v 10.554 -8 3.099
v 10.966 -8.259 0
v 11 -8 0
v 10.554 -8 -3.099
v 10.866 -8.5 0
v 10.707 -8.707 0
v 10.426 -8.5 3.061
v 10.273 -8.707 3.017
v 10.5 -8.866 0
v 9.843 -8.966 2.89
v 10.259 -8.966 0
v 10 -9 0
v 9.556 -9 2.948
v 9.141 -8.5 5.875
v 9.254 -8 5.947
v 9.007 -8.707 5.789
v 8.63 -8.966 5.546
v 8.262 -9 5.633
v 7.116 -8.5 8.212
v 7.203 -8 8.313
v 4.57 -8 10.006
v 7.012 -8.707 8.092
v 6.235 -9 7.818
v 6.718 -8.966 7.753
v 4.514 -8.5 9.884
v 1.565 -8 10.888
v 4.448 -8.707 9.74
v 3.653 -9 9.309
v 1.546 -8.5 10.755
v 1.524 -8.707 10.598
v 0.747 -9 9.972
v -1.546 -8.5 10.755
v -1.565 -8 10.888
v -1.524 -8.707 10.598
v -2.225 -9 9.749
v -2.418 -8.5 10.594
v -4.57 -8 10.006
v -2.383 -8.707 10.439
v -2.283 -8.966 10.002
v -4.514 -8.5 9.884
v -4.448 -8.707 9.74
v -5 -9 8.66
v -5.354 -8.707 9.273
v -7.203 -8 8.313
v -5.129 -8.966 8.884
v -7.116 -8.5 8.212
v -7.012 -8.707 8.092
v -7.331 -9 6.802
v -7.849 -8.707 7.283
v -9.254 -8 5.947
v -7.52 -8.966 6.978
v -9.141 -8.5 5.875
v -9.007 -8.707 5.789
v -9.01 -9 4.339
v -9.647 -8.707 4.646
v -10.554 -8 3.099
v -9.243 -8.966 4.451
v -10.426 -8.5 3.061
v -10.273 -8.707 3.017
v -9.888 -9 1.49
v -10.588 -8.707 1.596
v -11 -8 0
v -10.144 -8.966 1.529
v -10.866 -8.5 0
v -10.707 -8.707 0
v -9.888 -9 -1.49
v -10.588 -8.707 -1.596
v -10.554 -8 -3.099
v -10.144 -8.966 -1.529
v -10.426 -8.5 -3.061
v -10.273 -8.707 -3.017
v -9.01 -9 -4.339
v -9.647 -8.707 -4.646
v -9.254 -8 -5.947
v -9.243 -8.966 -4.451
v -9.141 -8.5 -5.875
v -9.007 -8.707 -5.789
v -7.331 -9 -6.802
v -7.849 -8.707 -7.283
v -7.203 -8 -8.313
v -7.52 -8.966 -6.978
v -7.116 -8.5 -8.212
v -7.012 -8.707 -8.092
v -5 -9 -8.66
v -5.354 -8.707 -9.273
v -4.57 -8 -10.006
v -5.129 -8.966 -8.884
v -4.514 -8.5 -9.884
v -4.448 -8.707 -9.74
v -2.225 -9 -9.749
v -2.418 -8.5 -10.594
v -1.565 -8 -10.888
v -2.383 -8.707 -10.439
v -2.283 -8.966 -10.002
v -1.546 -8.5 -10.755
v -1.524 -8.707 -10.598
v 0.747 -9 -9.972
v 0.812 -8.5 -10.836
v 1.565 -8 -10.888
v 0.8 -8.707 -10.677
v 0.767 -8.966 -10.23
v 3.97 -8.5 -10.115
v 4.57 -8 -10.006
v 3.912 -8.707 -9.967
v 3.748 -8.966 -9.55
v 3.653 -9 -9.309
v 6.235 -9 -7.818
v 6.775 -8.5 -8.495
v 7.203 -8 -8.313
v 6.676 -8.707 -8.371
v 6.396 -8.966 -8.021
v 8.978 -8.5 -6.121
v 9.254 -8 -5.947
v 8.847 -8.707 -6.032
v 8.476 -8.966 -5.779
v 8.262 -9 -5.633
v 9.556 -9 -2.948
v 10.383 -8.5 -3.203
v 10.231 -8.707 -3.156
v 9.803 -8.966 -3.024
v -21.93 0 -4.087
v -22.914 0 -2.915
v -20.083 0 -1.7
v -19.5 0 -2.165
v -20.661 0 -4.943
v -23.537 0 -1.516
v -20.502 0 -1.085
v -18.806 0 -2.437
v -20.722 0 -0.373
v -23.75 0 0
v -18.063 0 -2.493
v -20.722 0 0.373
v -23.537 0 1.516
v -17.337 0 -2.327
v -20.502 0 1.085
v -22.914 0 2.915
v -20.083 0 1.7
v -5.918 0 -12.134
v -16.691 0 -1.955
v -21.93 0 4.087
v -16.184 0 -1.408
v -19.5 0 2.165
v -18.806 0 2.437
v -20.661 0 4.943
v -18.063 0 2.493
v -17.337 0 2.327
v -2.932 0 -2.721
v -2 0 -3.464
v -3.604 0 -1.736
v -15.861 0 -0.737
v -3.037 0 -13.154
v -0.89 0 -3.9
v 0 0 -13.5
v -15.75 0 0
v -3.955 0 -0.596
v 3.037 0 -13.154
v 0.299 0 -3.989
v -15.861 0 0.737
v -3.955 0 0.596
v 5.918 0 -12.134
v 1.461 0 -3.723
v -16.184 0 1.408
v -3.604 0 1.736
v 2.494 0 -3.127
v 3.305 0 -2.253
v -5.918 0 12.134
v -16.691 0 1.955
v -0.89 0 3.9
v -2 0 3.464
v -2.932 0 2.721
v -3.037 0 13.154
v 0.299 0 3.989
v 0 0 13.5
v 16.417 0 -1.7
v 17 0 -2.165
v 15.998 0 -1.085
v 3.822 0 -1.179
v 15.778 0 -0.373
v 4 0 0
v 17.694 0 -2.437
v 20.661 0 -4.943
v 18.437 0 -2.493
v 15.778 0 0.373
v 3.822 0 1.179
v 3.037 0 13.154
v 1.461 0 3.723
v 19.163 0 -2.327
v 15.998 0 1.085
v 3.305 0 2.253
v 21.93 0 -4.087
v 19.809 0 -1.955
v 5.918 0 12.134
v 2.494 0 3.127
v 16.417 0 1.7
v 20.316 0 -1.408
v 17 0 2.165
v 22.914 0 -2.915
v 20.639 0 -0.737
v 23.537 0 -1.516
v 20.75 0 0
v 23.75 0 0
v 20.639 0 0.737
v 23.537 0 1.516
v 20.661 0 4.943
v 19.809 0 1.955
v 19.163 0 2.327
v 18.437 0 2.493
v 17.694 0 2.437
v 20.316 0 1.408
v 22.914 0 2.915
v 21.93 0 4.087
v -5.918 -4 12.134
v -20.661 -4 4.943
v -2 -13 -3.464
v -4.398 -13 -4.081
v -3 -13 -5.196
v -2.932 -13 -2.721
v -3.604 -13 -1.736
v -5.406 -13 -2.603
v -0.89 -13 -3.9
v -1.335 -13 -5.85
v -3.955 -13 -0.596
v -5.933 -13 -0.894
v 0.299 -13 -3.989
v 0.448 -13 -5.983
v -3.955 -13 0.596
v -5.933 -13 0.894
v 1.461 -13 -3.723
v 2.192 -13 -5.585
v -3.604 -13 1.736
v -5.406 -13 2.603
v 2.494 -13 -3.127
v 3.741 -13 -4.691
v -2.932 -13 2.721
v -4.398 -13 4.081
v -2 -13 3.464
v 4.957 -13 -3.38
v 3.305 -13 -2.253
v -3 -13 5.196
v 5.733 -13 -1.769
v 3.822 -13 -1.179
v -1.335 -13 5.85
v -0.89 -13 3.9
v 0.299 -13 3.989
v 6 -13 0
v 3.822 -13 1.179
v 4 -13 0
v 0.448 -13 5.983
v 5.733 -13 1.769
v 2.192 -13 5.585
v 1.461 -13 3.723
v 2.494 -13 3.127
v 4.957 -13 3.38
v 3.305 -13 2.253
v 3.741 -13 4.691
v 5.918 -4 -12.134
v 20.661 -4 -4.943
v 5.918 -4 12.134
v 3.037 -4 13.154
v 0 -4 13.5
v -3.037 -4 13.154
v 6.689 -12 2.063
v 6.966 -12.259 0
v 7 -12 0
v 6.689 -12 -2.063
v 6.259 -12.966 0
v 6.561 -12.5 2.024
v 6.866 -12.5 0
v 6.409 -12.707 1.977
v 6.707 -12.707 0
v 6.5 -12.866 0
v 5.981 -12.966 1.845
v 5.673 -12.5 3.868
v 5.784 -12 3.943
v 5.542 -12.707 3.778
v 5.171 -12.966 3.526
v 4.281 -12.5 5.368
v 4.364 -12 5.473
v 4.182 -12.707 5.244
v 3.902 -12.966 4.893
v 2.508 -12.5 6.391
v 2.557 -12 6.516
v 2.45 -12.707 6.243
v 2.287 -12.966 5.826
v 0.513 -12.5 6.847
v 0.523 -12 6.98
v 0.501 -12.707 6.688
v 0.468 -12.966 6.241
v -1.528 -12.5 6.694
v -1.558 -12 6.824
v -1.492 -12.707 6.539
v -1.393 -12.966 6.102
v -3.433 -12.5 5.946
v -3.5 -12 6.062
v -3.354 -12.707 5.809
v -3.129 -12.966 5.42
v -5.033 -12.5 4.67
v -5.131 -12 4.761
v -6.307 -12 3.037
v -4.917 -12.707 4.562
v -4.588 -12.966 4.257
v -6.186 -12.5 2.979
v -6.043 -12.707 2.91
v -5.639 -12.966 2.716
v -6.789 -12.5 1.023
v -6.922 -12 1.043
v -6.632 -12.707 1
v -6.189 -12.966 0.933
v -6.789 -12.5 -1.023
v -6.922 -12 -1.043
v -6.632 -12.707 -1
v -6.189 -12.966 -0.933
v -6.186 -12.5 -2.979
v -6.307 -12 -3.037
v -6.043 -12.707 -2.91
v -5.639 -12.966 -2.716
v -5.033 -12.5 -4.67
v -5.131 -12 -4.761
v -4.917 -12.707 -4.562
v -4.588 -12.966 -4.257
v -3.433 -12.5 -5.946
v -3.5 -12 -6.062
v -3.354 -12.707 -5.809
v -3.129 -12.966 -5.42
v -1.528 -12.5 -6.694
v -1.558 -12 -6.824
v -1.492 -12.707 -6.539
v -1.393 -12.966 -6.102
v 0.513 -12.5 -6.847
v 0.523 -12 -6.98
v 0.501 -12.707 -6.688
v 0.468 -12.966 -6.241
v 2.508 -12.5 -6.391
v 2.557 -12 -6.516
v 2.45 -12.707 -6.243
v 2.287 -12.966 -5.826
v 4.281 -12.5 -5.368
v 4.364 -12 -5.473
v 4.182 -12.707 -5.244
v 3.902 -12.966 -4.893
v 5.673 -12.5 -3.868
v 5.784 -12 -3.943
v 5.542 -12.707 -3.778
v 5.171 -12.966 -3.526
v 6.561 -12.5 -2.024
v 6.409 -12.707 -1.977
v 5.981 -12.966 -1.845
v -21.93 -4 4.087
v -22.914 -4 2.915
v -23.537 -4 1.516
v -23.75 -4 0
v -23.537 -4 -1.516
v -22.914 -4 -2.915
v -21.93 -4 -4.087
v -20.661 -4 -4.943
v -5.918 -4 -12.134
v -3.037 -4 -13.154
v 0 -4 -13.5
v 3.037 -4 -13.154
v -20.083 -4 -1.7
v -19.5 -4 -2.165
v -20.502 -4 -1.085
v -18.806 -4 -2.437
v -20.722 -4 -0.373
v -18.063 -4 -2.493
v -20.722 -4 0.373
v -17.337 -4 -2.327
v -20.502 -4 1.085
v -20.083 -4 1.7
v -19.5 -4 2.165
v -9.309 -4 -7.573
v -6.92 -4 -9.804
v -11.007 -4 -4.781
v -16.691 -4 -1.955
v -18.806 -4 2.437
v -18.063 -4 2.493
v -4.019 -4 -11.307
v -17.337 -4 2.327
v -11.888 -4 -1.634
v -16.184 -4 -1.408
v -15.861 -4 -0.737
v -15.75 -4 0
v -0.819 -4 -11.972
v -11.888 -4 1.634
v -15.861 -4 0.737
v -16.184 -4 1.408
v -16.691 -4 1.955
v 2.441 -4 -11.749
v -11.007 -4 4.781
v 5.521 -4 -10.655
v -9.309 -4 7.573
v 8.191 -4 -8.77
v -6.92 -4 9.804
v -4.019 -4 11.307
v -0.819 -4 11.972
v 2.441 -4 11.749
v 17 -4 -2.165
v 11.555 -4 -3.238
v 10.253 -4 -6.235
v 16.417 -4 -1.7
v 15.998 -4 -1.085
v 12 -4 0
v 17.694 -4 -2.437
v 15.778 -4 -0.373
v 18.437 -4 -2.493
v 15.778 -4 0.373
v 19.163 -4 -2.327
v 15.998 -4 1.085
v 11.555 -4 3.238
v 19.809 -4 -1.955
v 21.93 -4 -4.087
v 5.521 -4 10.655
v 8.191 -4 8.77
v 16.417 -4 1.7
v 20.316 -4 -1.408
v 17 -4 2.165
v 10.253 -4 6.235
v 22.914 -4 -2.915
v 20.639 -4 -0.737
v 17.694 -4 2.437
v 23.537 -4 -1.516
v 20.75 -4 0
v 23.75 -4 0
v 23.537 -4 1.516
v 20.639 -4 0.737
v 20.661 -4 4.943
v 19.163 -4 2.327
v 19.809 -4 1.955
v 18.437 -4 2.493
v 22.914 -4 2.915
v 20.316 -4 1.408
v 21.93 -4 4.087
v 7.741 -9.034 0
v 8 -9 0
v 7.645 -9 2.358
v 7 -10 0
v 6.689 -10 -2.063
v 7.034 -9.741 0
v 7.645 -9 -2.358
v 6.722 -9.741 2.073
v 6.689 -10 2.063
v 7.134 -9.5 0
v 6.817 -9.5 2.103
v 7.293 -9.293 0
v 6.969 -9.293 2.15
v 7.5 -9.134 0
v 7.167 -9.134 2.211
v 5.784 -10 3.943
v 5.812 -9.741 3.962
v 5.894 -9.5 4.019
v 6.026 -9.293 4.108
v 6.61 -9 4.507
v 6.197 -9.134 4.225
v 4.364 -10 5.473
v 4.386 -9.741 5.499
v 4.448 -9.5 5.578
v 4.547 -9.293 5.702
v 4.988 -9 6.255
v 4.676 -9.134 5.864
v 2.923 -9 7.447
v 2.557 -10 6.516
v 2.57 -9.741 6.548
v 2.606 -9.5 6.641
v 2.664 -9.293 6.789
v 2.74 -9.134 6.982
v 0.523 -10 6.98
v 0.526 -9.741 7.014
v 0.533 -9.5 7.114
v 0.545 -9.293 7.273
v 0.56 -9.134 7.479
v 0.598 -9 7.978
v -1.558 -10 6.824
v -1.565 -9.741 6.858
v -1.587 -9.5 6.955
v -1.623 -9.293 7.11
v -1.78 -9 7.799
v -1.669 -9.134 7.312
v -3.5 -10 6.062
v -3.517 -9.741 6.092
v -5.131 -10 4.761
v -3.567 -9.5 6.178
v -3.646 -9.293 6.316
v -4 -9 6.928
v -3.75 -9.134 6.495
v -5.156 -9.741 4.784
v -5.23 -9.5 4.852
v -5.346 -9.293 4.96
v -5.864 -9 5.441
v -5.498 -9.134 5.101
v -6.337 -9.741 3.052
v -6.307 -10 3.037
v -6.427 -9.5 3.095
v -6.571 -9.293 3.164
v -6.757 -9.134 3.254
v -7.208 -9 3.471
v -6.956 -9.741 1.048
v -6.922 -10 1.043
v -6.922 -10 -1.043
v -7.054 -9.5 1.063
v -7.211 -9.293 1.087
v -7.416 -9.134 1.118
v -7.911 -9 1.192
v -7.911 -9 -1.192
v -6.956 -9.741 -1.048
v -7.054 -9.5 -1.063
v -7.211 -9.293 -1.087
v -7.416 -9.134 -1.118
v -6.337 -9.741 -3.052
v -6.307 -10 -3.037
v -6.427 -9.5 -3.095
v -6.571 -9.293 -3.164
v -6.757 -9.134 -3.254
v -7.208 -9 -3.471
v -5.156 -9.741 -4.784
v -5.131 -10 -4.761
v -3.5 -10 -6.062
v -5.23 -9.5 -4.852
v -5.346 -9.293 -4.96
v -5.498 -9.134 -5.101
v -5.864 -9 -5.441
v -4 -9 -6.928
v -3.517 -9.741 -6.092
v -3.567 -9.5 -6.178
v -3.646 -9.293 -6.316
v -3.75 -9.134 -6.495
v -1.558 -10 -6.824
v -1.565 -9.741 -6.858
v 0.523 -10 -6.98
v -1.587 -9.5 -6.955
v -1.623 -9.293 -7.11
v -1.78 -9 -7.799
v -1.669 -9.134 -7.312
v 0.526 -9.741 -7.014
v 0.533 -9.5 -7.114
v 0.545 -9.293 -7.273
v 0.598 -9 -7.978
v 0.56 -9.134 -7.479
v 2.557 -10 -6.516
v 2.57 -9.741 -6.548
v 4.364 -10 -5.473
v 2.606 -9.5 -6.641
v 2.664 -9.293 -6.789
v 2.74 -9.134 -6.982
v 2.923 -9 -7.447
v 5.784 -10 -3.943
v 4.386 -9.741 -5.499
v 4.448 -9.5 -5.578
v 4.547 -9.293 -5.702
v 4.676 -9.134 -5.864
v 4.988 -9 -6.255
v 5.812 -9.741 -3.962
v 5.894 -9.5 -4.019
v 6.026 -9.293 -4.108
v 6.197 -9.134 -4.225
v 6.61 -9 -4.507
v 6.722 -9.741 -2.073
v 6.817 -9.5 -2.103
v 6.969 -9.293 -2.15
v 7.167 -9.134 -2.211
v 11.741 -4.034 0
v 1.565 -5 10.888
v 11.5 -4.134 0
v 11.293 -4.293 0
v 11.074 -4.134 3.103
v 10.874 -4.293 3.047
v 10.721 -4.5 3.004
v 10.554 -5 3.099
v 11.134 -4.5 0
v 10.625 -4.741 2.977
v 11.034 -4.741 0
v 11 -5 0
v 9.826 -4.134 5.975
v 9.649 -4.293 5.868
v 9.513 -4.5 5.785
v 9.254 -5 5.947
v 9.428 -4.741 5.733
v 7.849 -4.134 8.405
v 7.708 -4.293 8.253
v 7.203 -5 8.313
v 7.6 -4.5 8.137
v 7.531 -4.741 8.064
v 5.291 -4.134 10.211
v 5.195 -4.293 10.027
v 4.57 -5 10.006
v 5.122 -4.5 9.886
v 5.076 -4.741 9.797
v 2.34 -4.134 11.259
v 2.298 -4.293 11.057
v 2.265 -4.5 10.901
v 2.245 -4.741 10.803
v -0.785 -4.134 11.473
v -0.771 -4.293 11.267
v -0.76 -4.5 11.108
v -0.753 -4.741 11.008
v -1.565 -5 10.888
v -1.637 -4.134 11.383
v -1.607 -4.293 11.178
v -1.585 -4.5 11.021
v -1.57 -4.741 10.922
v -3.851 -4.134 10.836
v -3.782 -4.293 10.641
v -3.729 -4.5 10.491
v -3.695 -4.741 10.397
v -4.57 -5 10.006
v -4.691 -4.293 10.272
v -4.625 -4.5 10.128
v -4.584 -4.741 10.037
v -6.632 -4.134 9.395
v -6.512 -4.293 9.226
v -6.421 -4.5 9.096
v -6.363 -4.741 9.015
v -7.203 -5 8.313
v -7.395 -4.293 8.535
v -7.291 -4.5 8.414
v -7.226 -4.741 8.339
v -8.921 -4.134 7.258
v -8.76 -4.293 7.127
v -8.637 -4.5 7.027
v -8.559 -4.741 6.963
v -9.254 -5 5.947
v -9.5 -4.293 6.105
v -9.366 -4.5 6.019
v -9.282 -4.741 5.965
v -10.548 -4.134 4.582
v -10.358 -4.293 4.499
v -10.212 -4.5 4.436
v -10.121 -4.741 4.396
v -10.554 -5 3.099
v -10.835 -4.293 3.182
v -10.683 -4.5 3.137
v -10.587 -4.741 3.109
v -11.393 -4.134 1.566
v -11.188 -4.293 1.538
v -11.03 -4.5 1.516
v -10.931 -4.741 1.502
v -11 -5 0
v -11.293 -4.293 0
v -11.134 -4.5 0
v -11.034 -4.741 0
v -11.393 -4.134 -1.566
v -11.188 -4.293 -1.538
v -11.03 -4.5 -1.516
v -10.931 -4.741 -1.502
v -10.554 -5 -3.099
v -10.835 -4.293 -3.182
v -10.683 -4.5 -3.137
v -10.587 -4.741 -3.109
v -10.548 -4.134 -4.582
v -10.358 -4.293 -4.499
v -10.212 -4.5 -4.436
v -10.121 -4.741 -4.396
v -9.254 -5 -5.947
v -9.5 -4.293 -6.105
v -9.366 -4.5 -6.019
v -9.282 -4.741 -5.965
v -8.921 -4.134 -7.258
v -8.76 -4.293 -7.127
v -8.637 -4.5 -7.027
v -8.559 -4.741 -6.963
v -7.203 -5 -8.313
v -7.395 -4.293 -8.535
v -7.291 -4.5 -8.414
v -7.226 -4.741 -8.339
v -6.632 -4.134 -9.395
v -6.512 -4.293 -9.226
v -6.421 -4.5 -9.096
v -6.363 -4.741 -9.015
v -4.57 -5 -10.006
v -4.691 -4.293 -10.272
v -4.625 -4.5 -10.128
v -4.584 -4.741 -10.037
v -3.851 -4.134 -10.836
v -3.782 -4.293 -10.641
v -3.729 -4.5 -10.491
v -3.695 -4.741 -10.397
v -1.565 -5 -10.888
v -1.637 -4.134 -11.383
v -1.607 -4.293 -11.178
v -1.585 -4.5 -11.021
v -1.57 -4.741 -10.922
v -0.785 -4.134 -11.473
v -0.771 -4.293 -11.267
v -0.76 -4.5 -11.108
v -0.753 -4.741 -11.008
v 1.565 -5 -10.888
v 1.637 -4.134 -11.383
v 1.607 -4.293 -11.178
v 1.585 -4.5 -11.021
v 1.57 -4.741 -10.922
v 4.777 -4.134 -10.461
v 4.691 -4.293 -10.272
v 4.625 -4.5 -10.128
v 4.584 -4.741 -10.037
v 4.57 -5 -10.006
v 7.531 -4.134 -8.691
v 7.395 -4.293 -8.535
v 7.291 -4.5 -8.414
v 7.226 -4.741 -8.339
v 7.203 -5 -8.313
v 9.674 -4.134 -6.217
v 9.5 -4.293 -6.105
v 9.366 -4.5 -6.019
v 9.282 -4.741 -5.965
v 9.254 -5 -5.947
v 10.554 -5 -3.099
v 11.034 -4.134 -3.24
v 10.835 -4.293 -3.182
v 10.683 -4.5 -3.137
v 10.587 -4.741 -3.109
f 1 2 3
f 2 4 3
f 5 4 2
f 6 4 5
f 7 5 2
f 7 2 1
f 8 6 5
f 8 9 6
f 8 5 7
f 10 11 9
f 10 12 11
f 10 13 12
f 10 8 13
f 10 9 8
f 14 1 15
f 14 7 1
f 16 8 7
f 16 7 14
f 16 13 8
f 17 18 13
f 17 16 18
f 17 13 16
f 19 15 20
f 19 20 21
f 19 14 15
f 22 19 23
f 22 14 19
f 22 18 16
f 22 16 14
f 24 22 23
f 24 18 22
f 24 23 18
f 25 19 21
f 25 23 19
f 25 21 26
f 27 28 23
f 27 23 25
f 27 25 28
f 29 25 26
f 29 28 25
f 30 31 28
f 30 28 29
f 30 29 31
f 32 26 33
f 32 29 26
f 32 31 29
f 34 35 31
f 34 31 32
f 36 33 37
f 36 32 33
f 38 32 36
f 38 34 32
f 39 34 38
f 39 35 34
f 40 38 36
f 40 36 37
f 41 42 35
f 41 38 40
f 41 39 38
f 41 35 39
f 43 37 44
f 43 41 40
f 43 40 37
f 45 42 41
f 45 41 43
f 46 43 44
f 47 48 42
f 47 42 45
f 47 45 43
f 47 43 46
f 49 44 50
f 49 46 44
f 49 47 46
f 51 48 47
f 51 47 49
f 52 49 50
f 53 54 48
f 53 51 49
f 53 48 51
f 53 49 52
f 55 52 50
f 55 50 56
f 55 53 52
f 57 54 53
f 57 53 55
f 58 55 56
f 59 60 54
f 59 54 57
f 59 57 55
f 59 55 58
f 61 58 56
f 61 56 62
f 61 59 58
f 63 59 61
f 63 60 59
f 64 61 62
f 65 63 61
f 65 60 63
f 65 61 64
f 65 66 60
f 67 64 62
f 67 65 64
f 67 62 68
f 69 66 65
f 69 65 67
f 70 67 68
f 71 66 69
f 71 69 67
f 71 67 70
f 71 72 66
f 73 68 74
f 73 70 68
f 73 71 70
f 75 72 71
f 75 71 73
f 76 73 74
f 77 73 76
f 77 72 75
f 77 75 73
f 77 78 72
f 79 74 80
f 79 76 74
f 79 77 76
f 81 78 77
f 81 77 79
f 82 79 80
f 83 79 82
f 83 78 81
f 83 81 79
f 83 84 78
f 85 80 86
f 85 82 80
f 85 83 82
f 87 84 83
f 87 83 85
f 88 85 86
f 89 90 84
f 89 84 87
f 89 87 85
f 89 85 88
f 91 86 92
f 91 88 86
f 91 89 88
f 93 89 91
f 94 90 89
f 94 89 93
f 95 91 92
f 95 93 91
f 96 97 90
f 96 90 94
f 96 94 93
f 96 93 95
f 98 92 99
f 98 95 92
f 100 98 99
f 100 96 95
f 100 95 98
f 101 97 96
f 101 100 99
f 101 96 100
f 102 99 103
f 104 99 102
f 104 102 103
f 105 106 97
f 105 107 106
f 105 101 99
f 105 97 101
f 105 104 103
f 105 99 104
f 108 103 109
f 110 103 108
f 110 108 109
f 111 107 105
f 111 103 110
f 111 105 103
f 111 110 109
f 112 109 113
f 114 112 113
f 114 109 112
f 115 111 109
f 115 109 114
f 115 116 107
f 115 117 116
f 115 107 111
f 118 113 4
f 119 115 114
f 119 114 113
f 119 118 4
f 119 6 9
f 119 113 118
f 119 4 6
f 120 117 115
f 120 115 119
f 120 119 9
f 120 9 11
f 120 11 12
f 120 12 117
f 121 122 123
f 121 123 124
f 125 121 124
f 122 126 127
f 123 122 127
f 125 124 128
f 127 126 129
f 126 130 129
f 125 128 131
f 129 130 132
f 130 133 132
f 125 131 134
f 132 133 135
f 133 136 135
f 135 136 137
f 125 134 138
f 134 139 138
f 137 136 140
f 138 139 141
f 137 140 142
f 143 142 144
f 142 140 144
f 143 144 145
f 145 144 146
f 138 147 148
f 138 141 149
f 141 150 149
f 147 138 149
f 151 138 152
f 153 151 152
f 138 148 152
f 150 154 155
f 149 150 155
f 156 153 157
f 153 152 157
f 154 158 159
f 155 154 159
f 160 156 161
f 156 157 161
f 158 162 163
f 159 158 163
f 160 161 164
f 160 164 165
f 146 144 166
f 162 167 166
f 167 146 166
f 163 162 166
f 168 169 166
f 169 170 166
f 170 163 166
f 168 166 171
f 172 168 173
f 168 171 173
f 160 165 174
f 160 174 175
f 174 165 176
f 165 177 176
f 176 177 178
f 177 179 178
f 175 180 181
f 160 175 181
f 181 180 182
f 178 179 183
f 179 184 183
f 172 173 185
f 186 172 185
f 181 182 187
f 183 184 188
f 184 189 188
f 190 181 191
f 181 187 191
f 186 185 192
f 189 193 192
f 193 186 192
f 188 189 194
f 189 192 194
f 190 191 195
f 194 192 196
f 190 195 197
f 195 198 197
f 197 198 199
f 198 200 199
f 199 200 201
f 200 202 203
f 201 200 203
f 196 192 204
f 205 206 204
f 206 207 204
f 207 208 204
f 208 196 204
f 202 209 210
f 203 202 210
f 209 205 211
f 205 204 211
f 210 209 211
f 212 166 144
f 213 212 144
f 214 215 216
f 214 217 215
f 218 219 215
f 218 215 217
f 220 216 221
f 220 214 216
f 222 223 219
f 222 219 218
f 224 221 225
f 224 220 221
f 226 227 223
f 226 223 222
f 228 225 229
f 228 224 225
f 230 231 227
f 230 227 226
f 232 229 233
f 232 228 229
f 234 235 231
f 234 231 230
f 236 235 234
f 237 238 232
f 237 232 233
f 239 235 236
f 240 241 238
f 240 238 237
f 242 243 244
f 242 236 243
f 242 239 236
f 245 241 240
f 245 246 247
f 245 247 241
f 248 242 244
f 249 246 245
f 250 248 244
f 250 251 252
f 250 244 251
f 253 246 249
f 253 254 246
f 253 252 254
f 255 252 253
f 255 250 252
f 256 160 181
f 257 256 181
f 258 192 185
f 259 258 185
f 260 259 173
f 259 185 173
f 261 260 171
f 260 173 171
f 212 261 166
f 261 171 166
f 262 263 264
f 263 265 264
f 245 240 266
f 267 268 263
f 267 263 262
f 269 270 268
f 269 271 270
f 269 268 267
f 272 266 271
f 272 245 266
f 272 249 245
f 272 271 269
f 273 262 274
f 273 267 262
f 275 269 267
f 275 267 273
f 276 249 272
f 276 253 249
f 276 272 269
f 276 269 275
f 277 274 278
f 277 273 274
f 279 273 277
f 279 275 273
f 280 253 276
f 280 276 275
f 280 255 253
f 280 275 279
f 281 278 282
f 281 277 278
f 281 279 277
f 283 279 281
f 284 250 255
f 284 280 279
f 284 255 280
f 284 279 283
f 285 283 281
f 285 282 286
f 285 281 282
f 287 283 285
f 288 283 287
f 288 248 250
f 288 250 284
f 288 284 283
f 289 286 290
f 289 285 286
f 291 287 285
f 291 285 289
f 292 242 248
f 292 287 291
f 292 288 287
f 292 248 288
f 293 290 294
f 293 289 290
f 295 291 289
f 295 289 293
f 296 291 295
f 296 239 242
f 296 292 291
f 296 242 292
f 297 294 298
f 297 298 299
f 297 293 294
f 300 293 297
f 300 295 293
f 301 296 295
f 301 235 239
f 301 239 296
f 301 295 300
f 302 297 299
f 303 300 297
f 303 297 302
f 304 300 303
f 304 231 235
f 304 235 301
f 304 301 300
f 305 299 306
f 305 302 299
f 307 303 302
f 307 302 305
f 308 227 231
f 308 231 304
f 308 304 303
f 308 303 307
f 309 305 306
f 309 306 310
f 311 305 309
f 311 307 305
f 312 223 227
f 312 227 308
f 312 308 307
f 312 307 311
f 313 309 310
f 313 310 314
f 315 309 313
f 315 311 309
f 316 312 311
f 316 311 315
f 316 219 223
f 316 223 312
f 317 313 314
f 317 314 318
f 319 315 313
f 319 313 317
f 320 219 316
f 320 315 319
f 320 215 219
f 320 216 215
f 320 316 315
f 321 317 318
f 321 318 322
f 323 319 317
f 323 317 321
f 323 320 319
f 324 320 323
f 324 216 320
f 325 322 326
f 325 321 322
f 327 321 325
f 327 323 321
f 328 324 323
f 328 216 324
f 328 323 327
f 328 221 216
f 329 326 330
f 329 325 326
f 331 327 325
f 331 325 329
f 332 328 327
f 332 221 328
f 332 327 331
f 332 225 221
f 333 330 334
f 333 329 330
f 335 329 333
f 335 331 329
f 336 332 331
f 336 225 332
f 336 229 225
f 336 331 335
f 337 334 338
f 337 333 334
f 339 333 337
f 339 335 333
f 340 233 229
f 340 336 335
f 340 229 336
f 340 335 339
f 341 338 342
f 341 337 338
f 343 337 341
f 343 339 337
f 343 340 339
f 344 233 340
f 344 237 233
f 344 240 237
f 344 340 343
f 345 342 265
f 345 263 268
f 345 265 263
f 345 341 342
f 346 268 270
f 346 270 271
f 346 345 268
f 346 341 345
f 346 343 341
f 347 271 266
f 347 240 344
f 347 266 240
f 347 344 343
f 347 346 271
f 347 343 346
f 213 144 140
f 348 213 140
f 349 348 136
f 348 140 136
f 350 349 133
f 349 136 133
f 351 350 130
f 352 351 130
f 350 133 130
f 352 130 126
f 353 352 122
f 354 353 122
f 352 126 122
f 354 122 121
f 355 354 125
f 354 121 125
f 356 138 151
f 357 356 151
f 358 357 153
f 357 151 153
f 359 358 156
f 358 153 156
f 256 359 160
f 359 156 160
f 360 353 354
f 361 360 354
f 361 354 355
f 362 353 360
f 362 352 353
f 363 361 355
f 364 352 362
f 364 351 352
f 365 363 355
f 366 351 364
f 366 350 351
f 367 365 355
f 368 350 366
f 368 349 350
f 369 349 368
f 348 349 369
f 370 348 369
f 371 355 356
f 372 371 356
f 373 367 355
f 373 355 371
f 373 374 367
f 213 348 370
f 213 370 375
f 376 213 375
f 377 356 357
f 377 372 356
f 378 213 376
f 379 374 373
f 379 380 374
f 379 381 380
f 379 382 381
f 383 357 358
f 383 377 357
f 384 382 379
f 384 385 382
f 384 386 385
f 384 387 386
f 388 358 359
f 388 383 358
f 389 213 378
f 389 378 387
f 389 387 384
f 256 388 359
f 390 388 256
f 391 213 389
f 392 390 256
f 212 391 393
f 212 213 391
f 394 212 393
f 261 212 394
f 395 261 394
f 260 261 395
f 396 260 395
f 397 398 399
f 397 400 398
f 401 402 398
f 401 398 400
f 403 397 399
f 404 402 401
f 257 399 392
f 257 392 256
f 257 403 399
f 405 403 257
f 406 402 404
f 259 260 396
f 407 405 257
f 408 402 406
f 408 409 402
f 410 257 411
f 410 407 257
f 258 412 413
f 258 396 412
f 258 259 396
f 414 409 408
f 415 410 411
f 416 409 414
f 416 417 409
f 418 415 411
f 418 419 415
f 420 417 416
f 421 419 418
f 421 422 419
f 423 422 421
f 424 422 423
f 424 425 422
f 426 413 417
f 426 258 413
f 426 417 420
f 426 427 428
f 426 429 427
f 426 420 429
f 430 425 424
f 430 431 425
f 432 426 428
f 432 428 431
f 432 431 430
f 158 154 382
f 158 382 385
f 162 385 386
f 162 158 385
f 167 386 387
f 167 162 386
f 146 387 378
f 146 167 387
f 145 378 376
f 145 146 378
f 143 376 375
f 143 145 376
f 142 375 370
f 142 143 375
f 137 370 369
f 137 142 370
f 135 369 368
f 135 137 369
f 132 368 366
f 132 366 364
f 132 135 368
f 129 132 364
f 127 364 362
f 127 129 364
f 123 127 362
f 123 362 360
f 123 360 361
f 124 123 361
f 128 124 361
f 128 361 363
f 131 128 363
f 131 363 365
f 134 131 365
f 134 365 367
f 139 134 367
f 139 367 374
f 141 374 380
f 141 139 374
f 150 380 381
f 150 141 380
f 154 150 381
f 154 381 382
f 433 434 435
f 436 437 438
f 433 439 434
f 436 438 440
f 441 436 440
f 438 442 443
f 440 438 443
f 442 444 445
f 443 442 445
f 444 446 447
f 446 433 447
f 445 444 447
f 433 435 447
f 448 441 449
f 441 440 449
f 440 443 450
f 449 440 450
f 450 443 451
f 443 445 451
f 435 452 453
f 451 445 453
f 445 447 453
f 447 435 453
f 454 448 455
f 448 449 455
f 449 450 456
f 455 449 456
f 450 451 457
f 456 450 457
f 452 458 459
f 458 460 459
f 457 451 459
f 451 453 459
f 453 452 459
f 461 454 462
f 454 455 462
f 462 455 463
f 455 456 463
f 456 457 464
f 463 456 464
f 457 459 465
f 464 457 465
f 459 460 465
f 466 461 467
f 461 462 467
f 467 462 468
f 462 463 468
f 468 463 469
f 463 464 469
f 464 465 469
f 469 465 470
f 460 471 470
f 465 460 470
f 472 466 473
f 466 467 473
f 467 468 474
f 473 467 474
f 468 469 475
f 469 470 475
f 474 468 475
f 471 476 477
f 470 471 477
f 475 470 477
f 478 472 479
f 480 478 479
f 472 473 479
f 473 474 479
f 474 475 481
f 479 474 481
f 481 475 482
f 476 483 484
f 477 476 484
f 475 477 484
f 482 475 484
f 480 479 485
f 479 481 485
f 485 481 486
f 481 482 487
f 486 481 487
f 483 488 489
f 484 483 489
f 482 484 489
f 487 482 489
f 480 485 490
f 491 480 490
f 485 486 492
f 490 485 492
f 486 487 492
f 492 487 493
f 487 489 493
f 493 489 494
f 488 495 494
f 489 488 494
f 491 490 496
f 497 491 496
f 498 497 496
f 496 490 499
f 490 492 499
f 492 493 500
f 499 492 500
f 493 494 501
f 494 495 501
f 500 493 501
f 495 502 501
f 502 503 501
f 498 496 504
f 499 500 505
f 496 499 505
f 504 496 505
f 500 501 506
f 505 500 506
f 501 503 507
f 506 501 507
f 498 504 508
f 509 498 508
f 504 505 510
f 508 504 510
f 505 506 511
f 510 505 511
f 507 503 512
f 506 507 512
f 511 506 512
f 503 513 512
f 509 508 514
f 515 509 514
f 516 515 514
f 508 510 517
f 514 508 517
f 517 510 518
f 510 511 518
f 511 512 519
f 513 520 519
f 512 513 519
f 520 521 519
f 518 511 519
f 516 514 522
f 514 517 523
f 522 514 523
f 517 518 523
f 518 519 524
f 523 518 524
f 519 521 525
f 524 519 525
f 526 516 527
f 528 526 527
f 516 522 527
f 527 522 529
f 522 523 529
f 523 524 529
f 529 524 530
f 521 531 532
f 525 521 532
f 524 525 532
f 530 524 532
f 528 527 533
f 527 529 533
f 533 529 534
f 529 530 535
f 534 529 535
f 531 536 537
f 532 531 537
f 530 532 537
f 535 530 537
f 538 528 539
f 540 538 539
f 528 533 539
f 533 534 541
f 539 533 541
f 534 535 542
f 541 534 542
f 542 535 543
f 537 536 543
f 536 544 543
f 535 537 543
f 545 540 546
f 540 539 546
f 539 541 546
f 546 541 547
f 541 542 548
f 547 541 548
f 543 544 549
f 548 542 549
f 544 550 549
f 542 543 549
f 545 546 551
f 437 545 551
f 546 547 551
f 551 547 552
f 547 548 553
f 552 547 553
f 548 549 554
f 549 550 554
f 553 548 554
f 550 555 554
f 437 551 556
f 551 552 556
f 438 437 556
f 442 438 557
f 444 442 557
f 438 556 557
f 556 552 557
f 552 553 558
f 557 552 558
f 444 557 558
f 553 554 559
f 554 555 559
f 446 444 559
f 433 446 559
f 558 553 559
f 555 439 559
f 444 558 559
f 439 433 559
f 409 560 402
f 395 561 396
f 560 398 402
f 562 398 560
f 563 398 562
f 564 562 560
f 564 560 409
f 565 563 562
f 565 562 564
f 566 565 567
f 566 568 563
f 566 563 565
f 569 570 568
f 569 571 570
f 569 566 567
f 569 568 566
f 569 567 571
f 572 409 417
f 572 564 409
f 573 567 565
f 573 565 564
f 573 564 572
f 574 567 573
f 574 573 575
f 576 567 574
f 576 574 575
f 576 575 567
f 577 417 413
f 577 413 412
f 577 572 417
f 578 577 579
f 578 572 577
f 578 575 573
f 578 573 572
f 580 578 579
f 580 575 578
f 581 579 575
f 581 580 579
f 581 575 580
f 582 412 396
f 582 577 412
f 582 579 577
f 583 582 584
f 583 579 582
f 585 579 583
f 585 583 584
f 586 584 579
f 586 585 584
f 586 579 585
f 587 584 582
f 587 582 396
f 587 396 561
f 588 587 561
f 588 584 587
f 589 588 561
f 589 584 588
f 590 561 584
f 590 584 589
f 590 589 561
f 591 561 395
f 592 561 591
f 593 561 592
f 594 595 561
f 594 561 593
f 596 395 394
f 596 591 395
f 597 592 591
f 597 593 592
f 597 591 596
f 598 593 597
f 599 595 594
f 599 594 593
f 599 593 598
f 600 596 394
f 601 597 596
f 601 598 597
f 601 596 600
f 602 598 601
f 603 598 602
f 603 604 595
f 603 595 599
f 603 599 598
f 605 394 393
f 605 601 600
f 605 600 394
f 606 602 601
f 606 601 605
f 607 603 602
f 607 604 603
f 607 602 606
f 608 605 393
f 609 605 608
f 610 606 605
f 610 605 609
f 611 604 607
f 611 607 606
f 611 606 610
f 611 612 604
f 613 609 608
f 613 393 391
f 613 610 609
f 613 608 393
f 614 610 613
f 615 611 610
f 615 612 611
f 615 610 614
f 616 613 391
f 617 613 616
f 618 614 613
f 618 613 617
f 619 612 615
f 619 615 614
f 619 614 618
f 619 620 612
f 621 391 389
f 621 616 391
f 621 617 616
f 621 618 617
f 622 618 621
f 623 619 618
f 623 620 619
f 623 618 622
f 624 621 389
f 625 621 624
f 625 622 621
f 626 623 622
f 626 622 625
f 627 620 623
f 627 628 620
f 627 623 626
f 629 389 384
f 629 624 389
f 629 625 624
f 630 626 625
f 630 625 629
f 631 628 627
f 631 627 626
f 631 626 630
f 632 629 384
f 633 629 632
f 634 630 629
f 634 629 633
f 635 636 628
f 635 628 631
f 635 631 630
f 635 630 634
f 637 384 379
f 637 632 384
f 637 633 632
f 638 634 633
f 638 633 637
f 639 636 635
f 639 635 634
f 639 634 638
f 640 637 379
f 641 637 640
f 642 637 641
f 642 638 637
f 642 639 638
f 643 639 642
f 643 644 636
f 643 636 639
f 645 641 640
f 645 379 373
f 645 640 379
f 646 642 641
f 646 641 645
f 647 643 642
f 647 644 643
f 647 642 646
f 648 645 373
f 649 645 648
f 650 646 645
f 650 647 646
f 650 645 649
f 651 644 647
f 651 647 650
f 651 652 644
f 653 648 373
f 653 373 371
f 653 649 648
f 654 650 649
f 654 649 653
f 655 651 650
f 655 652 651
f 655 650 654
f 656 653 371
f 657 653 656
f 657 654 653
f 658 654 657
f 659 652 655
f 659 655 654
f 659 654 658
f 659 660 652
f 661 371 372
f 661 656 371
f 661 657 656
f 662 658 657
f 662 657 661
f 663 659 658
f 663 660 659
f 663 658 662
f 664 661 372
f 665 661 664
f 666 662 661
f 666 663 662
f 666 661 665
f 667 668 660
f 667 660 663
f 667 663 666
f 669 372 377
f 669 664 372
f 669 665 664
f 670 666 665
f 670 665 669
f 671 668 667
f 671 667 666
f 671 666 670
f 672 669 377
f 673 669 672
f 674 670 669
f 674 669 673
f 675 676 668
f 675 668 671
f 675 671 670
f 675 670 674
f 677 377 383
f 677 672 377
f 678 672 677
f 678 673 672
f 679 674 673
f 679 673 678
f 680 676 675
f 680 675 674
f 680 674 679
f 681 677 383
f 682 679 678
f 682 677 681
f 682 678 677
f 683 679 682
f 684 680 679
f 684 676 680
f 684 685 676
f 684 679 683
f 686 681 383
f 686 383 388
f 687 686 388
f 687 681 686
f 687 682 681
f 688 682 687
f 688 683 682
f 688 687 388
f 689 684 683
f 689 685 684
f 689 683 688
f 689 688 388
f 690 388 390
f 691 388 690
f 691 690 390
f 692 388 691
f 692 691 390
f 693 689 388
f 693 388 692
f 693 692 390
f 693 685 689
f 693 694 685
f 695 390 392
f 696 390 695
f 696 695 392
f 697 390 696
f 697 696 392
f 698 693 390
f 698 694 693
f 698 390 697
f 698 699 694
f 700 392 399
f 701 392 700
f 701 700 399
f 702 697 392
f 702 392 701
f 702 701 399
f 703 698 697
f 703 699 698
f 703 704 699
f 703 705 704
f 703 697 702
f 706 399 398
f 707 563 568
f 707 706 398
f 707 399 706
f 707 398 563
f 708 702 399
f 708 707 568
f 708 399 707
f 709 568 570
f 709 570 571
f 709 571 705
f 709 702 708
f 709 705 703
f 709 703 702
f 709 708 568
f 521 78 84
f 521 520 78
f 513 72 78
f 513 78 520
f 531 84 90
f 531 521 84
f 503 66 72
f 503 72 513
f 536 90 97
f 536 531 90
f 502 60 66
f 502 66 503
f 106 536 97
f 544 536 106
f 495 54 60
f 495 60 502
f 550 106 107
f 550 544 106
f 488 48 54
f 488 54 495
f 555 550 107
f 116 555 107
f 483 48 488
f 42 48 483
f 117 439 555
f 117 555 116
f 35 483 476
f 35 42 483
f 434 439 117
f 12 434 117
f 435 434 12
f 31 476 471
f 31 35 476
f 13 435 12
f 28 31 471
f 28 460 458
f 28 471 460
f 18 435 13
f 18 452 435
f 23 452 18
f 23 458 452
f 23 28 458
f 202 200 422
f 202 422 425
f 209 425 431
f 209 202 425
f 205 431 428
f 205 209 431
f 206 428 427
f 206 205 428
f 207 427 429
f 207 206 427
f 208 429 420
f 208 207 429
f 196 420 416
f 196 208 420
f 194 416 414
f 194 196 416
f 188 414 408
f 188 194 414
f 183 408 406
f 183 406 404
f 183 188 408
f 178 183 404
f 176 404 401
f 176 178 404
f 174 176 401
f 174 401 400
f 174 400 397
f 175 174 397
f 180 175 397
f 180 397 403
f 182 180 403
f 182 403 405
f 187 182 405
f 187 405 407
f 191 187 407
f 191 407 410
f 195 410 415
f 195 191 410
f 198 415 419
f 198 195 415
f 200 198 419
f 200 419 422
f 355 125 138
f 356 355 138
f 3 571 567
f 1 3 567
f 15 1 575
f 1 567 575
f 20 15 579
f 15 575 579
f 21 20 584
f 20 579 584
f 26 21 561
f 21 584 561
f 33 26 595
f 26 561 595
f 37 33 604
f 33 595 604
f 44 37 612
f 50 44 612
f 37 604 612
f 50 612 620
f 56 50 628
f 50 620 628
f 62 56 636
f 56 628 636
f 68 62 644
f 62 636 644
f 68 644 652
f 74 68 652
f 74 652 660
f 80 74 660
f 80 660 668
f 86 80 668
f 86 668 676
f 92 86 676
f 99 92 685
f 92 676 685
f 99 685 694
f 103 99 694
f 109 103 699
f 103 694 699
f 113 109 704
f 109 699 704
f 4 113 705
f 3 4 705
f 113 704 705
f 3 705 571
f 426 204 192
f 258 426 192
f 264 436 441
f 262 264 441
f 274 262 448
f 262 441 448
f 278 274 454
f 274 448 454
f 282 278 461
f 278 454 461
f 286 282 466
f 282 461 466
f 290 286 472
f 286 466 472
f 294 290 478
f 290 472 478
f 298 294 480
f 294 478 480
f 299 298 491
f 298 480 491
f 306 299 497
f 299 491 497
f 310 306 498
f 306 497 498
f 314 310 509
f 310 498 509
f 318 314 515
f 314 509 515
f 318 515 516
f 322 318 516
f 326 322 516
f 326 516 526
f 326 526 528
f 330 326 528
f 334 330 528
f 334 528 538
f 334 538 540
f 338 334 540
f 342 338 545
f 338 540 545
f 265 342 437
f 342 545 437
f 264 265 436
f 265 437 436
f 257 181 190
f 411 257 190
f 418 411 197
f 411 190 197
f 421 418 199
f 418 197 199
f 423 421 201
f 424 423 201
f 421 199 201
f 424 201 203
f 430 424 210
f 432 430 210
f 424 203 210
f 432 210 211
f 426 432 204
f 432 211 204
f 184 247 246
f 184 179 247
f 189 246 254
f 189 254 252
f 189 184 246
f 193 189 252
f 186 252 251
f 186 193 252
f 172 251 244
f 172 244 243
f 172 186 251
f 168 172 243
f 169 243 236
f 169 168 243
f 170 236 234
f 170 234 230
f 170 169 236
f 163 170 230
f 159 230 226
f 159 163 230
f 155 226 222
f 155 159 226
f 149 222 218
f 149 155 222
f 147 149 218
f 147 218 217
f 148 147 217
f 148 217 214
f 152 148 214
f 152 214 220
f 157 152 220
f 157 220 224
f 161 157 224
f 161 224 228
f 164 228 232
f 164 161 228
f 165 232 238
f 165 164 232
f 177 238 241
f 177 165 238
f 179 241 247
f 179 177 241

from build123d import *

# Parameters (mm, degrees)
F0_R     = 2.5
F0_R_2   = 4
F1_DEPTH = 4
F2_R     = 11
F2_R_2   = 4
F3_DEPTH = 5
F4_R     = 7
F4_R_2   = 4
F5_DEPTH = 4
F6_R     = 1


with BuildPart() as f1:
    # F0 (on Front) → F1 (new body)
    with BuildSketch(Plane.XZ):
        with BuildLine():
            Line((-20.660959, -4.943407), (-5.917808, -12.133818))
            ThreePointArc((-5.917808, -12.133818), (0, -13.5), (5.917808, -12.133818))
            Line((5.917808, -12.133818), (20.660959, -4.943407))
            ThreePointArc((20.660959, -4.943407), (23.75, 0), (20.660959, 4.943407))
            Line((20.660959, 4.943407), (5.917808, 12.133818))
            ThreePointArc((5.917808, 12.133818), (0, 13.5), (-5.917808, 12.133818))
            Line((-5.917808, 12.133818), (-20.660959, 4.943407))
            ThreePointArc((-20.660959, 4.943407), (-23.75, 0), (-20.660959, -4.943407))
        make_face()
        with Locations((-18.25, 0)):
            Circle(F0_R, mode=Mode.SUBTRACT)
        Circle(F0_R_2, mode=Mode.SUBTRACT)
        with Locations((18.25, 0)):
            Circle(F0_R, mode=Mode.SUBTRACT)
    extrude(amount=F1_DEPTH)

    # F2 (on face) → F3 (join)
    with BuildSketch(Plane.XZ.offset(4)):
        Circle(F2_R)
        Circle(F2_R_2, mode=Mode.SUBTRACT)
    extrude(amount=F3_DEPTH)

    # F4 (on face) → F5 (join)
    with BuildSketch(Plane.XZ.offset(9)):
        Circle(F4_R)
        Circle(F4_R_2, mode=Mode.SUBTRACT)
    extrude(amount=F5_DEPTH)

    # F6
    f6_edges = [f1.edges().sort_by_distance(p)[0] for p in [
        (-11, -9, 0),
        (-7, -9, 0),
        (-11, -4, 0),
        (-7, -13, 0),
    ]]
    fillet(f6_edges, radius=F6_R)


solid = f1.part
